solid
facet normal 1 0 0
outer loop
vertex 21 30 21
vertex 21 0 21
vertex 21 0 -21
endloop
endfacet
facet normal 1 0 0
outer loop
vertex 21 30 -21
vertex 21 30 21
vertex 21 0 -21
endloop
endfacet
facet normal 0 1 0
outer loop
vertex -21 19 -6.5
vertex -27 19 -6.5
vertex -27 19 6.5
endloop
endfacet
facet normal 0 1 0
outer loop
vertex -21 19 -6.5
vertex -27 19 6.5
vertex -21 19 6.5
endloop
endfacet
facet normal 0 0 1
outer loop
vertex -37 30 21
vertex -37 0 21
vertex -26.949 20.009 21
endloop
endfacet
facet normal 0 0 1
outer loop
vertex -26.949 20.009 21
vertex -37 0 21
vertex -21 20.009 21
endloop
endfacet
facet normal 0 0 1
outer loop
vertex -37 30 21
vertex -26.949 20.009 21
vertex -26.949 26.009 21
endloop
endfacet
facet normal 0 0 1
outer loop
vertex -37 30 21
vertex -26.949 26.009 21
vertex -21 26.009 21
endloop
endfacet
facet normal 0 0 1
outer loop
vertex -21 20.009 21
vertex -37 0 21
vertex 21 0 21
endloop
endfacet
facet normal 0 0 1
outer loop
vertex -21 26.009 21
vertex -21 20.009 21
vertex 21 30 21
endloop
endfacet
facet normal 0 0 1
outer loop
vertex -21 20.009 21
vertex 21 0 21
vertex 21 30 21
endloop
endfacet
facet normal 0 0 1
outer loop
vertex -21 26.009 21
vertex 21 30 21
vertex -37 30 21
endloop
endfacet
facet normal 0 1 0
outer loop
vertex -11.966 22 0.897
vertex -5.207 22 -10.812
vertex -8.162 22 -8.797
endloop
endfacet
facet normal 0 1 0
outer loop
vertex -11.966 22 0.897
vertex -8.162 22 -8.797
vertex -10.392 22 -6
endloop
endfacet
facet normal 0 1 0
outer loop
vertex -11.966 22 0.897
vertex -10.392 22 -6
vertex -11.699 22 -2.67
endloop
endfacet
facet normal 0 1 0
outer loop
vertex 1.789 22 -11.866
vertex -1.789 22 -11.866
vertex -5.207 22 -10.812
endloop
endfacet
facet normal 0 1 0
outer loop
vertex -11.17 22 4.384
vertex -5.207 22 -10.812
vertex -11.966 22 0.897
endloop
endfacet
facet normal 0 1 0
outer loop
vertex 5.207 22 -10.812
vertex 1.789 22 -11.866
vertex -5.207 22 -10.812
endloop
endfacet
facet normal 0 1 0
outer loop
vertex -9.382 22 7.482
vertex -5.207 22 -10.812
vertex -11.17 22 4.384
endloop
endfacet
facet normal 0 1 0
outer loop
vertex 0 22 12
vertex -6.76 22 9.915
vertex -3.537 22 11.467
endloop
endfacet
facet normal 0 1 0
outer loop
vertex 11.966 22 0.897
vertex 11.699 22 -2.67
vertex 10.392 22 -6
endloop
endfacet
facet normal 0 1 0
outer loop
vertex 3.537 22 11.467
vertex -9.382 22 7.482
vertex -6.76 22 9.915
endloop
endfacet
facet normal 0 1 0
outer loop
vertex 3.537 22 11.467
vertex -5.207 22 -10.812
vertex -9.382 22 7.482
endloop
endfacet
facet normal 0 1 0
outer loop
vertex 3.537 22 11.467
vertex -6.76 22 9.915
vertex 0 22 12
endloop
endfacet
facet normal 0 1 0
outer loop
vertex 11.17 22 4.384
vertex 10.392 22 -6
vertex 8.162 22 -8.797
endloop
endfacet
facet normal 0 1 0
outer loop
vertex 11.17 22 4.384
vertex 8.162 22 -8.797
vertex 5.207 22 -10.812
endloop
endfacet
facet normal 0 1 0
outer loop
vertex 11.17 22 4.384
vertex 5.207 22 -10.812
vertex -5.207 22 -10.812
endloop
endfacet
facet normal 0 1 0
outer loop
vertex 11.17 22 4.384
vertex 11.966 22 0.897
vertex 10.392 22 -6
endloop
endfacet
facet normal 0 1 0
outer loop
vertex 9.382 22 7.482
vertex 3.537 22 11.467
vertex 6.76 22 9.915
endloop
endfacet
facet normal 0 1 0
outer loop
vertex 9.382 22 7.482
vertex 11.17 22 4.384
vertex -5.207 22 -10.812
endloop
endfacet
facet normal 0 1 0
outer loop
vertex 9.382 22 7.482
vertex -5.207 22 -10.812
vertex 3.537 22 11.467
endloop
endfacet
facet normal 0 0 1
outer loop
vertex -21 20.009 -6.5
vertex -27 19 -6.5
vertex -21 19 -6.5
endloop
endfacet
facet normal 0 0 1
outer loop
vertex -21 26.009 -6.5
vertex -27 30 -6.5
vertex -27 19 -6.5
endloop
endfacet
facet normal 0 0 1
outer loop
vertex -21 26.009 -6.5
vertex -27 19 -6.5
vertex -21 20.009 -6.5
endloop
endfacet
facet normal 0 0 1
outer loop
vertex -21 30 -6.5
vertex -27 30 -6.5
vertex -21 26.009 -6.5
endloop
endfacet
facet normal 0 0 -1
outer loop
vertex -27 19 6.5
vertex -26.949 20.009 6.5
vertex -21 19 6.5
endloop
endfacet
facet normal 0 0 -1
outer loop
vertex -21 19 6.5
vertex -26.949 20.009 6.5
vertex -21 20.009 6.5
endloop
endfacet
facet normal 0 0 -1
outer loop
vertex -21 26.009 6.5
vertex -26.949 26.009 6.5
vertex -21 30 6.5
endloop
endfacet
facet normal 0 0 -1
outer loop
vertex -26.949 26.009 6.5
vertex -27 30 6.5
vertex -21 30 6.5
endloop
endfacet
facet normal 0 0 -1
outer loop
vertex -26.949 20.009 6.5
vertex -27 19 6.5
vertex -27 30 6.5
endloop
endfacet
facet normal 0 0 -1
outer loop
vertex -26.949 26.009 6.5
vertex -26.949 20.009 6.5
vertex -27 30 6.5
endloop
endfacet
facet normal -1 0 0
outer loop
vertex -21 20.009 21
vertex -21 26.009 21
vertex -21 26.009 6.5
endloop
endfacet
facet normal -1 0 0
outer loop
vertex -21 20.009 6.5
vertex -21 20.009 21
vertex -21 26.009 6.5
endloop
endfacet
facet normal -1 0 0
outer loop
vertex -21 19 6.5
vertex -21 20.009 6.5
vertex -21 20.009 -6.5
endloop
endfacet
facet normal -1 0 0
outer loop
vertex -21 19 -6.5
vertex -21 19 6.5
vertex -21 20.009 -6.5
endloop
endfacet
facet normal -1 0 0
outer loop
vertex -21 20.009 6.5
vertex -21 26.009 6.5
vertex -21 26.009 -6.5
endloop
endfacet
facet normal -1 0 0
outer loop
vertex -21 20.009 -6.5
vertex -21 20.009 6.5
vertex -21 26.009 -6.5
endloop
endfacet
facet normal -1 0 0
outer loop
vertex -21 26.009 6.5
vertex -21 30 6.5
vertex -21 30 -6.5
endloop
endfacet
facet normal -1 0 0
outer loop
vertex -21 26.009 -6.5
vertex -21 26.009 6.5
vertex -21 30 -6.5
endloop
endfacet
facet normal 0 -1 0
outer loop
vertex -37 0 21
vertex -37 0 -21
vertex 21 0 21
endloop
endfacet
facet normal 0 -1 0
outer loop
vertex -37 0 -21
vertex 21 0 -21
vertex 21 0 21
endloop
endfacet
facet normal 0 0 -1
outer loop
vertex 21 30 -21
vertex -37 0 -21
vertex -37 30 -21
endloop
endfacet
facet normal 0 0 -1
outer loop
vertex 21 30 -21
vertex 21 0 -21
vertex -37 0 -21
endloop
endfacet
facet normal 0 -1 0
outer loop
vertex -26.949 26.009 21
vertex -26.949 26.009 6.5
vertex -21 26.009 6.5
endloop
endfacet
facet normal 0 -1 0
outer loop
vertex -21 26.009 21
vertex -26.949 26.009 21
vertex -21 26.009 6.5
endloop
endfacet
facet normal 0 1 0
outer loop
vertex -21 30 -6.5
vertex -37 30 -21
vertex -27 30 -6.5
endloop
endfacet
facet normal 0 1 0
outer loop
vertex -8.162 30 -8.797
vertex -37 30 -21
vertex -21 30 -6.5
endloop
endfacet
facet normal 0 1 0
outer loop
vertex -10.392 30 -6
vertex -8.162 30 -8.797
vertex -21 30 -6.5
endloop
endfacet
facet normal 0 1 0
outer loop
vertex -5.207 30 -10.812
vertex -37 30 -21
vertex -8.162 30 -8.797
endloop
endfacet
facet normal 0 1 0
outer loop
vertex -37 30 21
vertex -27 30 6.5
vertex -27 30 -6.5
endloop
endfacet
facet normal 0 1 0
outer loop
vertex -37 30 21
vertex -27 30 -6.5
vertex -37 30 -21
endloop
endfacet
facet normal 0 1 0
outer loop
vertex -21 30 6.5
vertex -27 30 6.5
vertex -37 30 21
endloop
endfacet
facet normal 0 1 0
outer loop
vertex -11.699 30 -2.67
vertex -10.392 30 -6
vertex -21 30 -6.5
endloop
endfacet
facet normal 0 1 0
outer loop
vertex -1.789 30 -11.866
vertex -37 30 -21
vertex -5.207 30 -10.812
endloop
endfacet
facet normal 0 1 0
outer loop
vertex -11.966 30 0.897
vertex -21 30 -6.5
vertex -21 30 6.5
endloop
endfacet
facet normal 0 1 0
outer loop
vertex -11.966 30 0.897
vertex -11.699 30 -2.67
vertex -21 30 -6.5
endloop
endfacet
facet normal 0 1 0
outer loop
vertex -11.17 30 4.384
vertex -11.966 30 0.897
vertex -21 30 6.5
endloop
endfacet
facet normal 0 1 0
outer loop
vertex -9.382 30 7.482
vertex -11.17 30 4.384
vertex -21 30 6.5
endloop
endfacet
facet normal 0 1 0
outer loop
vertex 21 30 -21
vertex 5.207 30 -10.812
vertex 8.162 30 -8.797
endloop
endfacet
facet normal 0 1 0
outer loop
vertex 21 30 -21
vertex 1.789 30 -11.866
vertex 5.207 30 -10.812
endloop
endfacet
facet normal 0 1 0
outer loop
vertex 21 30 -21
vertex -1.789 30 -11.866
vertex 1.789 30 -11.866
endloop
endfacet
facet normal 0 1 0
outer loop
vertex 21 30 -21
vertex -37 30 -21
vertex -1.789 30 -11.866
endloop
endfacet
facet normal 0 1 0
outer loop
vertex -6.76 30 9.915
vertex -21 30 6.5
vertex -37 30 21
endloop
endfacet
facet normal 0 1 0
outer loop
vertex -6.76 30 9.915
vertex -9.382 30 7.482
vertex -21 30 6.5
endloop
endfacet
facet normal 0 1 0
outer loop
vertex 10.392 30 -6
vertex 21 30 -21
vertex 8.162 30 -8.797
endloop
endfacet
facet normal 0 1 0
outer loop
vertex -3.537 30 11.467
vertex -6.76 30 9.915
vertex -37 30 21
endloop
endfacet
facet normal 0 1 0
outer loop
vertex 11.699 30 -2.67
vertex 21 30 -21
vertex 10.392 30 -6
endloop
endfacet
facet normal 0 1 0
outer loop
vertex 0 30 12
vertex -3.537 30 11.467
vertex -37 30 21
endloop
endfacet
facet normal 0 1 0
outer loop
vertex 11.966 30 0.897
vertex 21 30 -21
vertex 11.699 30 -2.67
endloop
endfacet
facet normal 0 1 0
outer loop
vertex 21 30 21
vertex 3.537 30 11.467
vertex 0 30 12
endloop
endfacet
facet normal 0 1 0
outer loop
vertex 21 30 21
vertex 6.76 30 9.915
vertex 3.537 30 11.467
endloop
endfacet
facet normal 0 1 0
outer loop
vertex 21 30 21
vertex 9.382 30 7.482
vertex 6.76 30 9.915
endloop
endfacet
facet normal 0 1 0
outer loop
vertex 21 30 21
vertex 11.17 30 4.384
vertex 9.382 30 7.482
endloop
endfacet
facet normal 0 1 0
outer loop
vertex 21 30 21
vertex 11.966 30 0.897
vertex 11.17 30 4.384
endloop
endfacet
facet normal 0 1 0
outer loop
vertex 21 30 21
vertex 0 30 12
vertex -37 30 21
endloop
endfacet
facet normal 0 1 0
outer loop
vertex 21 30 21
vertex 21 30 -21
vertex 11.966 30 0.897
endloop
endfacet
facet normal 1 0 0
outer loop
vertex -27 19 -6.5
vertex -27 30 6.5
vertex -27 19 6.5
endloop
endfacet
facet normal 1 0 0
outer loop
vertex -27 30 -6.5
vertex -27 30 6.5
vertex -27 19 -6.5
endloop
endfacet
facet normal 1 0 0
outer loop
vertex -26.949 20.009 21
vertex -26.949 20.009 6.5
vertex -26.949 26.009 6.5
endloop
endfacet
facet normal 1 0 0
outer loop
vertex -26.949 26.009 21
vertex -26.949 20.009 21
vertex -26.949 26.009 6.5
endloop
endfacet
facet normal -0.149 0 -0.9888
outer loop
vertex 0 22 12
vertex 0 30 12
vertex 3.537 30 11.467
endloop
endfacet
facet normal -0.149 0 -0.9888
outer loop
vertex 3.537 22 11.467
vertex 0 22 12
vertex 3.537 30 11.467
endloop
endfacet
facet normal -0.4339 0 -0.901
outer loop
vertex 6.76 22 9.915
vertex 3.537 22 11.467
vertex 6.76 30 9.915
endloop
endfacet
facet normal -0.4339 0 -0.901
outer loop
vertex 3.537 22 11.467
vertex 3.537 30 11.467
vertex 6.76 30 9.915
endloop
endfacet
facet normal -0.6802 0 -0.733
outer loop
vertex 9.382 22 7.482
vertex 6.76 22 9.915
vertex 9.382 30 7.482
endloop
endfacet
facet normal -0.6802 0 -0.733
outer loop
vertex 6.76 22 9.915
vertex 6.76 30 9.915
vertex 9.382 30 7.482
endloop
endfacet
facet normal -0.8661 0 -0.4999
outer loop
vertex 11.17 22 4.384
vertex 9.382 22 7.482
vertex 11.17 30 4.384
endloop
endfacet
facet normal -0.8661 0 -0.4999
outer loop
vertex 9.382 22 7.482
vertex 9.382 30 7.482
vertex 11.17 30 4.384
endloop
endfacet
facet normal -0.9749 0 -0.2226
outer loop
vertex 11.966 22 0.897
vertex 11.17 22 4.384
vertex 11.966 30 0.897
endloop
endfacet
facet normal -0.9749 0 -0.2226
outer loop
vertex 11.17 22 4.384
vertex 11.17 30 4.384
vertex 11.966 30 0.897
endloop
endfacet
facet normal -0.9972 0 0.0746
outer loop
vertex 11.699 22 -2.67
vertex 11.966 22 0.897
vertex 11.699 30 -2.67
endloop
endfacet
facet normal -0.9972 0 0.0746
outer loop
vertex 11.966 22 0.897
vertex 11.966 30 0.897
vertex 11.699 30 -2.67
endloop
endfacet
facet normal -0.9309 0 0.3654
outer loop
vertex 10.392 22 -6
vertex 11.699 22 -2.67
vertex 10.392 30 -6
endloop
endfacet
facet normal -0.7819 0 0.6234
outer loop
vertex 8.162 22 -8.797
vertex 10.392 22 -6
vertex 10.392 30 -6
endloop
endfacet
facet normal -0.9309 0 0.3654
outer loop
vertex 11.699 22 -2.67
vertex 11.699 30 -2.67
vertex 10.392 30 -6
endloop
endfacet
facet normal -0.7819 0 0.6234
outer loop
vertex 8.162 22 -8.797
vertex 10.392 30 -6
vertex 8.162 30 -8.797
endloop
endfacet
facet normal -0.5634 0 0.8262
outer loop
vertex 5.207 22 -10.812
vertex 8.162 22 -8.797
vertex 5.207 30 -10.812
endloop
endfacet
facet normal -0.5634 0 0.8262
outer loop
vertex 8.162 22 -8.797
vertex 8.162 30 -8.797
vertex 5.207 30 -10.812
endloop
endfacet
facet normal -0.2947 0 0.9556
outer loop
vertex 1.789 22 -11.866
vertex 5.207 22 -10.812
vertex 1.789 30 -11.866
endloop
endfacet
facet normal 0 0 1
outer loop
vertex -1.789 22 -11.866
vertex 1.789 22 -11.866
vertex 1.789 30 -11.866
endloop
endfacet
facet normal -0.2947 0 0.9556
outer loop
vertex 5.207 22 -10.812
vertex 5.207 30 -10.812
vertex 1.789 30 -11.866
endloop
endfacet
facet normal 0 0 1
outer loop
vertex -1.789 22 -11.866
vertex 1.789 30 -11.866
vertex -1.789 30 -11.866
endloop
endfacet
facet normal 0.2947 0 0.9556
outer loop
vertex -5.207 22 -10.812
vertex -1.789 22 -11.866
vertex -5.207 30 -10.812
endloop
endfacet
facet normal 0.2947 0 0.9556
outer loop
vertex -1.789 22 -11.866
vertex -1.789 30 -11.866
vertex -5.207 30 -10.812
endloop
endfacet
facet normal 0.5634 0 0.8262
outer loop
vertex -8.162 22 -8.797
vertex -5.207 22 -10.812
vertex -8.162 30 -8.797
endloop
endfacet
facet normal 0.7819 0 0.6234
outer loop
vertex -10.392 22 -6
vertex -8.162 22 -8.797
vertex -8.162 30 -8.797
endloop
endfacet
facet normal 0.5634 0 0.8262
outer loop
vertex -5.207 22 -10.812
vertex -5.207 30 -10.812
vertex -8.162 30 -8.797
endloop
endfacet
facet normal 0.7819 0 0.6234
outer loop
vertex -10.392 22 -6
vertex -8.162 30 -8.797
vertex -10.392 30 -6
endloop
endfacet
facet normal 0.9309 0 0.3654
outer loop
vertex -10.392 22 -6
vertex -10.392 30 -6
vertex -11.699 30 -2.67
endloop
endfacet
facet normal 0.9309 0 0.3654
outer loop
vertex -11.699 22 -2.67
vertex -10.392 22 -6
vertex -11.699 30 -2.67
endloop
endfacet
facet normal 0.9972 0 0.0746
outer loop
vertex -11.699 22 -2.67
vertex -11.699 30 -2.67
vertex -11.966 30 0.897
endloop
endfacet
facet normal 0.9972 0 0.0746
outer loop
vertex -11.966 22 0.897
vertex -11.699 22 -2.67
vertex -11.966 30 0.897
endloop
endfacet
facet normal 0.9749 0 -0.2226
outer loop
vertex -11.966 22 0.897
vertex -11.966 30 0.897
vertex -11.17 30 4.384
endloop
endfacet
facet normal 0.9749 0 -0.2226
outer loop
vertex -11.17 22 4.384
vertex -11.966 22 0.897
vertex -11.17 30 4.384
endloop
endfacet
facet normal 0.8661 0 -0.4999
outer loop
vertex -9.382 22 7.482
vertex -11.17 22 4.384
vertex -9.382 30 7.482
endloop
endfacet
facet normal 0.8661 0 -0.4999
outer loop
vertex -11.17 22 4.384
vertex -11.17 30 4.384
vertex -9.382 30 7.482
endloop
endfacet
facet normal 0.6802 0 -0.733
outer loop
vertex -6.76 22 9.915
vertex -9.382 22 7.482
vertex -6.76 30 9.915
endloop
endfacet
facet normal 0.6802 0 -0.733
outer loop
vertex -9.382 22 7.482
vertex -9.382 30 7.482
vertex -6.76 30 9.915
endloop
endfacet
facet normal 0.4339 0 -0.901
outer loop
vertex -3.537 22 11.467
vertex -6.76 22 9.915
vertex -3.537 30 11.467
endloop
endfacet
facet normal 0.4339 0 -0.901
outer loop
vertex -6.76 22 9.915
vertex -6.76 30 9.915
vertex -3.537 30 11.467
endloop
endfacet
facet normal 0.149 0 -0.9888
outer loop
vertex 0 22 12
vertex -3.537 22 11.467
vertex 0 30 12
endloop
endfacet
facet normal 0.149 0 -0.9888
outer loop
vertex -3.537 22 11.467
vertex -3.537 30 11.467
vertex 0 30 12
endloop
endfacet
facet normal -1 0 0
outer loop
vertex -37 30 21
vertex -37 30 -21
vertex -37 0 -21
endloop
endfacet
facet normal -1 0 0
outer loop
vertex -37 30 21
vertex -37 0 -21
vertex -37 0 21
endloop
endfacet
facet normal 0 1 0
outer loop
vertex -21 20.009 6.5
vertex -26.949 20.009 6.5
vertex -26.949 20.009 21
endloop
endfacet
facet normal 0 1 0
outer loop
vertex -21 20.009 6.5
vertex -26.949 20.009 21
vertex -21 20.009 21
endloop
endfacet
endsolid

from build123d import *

# Parameters (mm, degrees)
ESQUISSE1_W             = 42
ESQUISSE1_H             = 42
BOSS_EXTRU_1_DEPTH      = 30
ESQUISSE2_R             = 12
ENL_V_MAT_EXTRU_1_DEPTH = 8
ESQUISSE4_W             = 42
ESQUISSE4_H             = 30
BOSS_EXTRU_3_DEPTH      = 16
ESQUISSE5_W             = 6
ESQUISSE5_H             = 13
ENL_V_MAT_EXTRU_2_DEPTH = 11
ESQUISSE6_W             = 5.949379811
ESQUISSE6_H             = 6
ENL_V_MAT_EXTRU_3_DEPTH = 56.00227268


with BuildPart() as part:
    # Esquisse1 → Boss.-Extru.1 (new body)
    with BuildSketch(Plane(origin=(0, 0, 0), x_dir=(1, 0, 0), z_dir=(0, 1, 0))):
        Rectangle(ESQUISSE1_W, ESQUISSE1_H)
    extrude(amount=BOSS_EXTRU_1_DEPTH)

    # Esquisse2 → Enlèv. mat.-Extru.1 (cut)
    with BuildSketch(Plane(origin=(0, 30, 0), x_dir=(1, 0, 0), z_dir=(0, 1, 0))):
        with Locations(Location((0, 0, 0), (0, 0, 270))):
            Circle(ESQUISSE2_R)
    extrude(amount=-ENL_V_MAT_EXTRU_1_DEPTH, mode=Mode.SUBTRACT)

    # Esquisse4 → Boss.-Extru.3 (add)
    with BuildSketch(Plane.ZY.offset(21)):
        with Locations((0, 15)):
            Rectangle(ESQUISSE4_W, ESQUISSE4_H)
    extrude(amount=BOSS_EXTRU_3_DEPTH)

    # Esquisse5 → Enlèv. mat.-Extru.2 (cut)
    with BuildSketch(Plane(origin=(0, 30, 0), x_dir=(1, 0, 0), z_dir=(0, 1, 0))):
        with Locations((-24, 0)):
            Rectangle(ESQUISSE5_W, ESQUISSE5_H)
    extrude(amount=-ENL_V_MAT_EXTRU_2_DEPTH, mode=Mode.SUBTRACT)

    # Esquisse6 → Enlèv. mat.-Extru.3 (cut, through all)
    with BuildSketch(Plane.XY.offset(-6.5)):
        with Locations((-23.974689906, 23.009155876)):
            Rectangle(ESQUISSE6_W, ESQUISSE6_H)
    extrude(amount=ENL_V_MAT_EXTRU_3_DEPTH, mode=Mode.SUBTRACT)


solid = part.part
